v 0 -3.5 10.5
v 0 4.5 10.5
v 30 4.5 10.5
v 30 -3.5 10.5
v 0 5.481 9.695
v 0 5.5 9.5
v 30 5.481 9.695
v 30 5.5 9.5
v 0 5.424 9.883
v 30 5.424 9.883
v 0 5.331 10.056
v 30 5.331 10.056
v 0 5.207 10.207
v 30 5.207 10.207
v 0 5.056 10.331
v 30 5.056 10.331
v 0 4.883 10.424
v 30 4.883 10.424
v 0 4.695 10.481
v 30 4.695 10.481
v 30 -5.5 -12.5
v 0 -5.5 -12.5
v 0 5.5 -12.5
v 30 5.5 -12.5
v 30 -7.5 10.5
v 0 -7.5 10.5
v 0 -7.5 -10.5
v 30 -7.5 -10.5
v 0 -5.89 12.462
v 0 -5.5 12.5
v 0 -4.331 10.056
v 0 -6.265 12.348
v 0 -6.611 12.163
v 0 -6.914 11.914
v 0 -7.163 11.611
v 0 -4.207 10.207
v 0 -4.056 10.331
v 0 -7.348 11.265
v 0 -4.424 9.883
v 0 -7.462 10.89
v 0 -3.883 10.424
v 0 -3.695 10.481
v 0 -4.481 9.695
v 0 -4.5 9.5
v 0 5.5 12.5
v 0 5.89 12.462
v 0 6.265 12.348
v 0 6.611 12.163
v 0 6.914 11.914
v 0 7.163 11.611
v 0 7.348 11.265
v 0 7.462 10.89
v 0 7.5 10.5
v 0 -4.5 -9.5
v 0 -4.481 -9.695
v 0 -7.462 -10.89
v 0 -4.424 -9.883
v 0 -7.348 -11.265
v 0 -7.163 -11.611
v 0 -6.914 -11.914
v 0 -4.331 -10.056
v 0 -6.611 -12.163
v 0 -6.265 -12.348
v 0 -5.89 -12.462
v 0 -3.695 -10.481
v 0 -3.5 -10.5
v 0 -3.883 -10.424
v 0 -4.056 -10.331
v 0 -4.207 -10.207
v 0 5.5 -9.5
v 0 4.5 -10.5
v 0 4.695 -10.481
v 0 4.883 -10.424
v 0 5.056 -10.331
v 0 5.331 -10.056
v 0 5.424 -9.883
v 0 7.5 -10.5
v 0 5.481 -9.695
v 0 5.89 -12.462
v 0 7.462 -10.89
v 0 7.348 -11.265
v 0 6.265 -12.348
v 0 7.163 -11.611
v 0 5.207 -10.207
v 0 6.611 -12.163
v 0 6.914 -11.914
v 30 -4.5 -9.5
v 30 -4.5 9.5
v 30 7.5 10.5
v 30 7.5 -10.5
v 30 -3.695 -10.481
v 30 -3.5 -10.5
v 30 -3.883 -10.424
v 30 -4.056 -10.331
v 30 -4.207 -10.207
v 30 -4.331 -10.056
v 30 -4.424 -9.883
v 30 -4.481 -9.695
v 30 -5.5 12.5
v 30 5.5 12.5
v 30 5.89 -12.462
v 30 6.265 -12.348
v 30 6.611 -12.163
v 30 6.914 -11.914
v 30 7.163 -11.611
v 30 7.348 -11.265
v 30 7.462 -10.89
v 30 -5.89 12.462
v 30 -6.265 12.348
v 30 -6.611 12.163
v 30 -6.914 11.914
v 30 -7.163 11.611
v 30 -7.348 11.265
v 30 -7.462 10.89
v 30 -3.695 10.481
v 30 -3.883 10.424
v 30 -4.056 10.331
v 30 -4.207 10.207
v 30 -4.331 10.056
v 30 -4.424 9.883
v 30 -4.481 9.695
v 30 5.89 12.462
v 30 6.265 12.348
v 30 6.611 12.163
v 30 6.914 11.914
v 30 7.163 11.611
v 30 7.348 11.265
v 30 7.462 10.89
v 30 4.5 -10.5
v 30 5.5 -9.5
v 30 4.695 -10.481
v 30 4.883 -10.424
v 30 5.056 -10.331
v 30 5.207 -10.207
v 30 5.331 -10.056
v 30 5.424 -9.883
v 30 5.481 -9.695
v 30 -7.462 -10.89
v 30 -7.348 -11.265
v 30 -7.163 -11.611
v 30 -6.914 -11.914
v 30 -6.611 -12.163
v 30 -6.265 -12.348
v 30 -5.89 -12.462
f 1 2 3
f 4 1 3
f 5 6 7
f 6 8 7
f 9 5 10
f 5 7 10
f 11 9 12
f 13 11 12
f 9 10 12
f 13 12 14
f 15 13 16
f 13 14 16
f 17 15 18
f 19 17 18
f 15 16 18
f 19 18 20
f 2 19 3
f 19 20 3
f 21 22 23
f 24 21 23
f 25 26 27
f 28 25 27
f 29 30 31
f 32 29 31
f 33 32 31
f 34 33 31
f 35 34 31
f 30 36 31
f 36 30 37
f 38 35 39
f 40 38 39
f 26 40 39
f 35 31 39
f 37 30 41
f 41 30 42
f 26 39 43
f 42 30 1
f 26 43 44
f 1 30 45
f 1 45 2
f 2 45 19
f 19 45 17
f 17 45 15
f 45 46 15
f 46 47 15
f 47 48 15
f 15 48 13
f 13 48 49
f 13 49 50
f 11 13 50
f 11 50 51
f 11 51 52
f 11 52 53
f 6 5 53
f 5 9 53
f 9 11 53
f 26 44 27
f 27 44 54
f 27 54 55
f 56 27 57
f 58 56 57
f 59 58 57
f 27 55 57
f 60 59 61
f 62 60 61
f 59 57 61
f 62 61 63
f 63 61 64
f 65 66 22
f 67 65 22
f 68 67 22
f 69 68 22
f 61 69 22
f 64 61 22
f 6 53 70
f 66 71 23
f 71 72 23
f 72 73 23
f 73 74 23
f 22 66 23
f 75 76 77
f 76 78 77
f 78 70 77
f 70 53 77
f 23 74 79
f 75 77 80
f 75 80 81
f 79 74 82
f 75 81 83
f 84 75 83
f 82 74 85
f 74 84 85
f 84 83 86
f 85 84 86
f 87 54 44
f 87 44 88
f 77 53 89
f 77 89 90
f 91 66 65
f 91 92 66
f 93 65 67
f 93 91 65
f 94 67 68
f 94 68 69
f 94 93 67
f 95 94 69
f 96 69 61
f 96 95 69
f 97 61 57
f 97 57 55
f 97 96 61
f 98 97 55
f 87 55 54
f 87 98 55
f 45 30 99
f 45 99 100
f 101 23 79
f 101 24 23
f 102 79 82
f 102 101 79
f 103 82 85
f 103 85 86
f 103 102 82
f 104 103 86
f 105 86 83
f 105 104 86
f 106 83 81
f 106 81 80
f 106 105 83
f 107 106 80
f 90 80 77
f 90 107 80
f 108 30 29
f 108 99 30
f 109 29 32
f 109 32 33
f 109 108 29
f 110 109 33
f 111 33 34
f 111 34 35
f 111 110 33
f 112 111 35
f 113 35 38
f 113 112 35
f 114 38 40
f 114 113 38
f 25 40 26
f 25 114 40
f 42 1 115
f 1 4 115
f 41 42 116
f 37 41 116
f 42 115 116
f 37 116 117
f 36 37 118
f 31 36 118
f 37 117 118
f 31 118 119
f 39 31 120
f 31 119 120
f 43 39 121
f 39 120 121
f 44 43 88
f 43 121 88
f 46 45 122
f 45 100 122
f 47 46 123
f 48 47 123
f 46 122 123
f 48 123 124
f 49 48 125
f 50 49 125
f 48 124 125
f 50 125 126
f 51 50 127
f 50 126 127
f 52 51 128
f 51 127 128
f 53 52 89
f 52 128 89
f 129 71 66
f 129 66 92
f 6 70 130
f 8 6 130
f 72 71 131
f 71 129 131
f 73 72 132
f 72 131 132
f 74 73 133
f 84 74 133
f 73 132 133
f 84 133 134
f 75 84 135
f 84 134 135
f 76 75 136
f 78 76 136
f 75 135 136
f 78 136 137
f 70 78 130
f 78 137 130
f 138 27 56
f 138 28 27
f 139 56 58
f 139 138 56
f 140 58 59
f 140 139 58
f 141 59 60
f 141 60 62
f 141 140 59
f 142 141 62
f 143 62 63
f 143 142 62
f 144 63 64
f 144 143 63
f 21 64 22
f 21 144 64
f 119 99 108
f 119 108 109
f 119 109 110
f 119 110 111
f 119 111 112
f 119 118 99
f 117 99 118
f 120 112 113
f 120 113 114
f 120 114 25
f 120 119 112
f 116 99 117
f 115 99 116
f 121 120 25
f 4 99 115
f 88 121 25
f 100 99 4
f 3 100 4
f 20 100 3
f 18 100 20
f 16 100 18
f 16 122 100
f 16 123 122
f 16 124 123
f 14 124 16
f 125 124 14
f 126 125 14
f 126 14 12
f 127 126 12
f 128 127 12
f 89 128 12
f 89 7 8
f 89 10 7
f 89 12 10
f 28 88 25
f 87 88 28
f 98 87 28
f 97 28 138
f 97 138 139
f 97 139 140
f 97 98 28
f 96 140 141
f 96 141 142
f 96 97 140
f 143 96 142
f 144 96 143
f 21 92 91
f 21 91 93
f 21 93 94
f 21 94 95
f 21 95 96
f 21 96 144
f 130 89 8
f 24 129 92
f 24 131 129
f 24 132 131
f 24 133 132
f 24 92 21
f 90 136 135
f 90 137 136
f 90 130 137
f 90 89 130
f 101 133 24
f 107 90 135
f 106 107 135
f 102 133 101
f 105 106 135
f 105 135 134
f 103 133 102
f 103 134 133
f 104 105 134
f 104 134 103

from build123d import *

# Parameters (mm, degrees)
SKETCH1_W           = 25
SKETCH1_H           = 15
BOSS_EXTRUDE1_DEPTH = 30
FILLET1_R           = 2
SHELL1_START        = -10.5
SHELL1_OUTLINE_W    = 30
SHELL1_OUTLINE_H    = 10
SHELL1_DEPTH        = 21
FILLET3_R           = 1


# Read off the part's stored shape, not the designer's step: Shell1
with BuildPart() as part:
    # Sketch1 → Boss-Extrude1 (new body)
    with BuildSketch(Plane(origin=(0, 0, 0), x_dir=(0, 0, -1), z_dir=(1, 0, 0))):
        Rectangle(SKETCH1_W, SKETCH1_H)
    extrude(amount=BOSS_EXTRUDE1_DEPTH)

    # Fillet1
    fillet1_edges = [part.edges().sort_by_distance(p)[0] for p in [
        (15, -7.5, -12.5),
        (15, -7.5, 12.5),
        (15, 7.5, 12.5),
        (15, 7.5, -12.5),
    ]]
    fillet(fillet1_edges, radius=FILLET1_R)

    # Shell1 outline → Shell1 (cut)
    with BuildSketch(Plane.XY.offset(SHELL1_START)):
        with Locations((15, 0.5)):
            Rectangle(SHELL1_OUTLINE_W, SHELL1_OUTLINE_H)
    extrude(amount=SHELL1_DEPTH, mode=Mode.SUBTRACT)

    # Fillet3
    fillet3_edges = [part.edges().sort_by_distance(p)[0] for p in [
        (15, 5.5, -10.5),
        (15, 5.5, 10.5),
        (15, -4.5, 10.5),
        (15, -4.5, -10.5),
    ]]
    fillet(fillet3_edges, radius=FILLET3_R)


solid = part.part
